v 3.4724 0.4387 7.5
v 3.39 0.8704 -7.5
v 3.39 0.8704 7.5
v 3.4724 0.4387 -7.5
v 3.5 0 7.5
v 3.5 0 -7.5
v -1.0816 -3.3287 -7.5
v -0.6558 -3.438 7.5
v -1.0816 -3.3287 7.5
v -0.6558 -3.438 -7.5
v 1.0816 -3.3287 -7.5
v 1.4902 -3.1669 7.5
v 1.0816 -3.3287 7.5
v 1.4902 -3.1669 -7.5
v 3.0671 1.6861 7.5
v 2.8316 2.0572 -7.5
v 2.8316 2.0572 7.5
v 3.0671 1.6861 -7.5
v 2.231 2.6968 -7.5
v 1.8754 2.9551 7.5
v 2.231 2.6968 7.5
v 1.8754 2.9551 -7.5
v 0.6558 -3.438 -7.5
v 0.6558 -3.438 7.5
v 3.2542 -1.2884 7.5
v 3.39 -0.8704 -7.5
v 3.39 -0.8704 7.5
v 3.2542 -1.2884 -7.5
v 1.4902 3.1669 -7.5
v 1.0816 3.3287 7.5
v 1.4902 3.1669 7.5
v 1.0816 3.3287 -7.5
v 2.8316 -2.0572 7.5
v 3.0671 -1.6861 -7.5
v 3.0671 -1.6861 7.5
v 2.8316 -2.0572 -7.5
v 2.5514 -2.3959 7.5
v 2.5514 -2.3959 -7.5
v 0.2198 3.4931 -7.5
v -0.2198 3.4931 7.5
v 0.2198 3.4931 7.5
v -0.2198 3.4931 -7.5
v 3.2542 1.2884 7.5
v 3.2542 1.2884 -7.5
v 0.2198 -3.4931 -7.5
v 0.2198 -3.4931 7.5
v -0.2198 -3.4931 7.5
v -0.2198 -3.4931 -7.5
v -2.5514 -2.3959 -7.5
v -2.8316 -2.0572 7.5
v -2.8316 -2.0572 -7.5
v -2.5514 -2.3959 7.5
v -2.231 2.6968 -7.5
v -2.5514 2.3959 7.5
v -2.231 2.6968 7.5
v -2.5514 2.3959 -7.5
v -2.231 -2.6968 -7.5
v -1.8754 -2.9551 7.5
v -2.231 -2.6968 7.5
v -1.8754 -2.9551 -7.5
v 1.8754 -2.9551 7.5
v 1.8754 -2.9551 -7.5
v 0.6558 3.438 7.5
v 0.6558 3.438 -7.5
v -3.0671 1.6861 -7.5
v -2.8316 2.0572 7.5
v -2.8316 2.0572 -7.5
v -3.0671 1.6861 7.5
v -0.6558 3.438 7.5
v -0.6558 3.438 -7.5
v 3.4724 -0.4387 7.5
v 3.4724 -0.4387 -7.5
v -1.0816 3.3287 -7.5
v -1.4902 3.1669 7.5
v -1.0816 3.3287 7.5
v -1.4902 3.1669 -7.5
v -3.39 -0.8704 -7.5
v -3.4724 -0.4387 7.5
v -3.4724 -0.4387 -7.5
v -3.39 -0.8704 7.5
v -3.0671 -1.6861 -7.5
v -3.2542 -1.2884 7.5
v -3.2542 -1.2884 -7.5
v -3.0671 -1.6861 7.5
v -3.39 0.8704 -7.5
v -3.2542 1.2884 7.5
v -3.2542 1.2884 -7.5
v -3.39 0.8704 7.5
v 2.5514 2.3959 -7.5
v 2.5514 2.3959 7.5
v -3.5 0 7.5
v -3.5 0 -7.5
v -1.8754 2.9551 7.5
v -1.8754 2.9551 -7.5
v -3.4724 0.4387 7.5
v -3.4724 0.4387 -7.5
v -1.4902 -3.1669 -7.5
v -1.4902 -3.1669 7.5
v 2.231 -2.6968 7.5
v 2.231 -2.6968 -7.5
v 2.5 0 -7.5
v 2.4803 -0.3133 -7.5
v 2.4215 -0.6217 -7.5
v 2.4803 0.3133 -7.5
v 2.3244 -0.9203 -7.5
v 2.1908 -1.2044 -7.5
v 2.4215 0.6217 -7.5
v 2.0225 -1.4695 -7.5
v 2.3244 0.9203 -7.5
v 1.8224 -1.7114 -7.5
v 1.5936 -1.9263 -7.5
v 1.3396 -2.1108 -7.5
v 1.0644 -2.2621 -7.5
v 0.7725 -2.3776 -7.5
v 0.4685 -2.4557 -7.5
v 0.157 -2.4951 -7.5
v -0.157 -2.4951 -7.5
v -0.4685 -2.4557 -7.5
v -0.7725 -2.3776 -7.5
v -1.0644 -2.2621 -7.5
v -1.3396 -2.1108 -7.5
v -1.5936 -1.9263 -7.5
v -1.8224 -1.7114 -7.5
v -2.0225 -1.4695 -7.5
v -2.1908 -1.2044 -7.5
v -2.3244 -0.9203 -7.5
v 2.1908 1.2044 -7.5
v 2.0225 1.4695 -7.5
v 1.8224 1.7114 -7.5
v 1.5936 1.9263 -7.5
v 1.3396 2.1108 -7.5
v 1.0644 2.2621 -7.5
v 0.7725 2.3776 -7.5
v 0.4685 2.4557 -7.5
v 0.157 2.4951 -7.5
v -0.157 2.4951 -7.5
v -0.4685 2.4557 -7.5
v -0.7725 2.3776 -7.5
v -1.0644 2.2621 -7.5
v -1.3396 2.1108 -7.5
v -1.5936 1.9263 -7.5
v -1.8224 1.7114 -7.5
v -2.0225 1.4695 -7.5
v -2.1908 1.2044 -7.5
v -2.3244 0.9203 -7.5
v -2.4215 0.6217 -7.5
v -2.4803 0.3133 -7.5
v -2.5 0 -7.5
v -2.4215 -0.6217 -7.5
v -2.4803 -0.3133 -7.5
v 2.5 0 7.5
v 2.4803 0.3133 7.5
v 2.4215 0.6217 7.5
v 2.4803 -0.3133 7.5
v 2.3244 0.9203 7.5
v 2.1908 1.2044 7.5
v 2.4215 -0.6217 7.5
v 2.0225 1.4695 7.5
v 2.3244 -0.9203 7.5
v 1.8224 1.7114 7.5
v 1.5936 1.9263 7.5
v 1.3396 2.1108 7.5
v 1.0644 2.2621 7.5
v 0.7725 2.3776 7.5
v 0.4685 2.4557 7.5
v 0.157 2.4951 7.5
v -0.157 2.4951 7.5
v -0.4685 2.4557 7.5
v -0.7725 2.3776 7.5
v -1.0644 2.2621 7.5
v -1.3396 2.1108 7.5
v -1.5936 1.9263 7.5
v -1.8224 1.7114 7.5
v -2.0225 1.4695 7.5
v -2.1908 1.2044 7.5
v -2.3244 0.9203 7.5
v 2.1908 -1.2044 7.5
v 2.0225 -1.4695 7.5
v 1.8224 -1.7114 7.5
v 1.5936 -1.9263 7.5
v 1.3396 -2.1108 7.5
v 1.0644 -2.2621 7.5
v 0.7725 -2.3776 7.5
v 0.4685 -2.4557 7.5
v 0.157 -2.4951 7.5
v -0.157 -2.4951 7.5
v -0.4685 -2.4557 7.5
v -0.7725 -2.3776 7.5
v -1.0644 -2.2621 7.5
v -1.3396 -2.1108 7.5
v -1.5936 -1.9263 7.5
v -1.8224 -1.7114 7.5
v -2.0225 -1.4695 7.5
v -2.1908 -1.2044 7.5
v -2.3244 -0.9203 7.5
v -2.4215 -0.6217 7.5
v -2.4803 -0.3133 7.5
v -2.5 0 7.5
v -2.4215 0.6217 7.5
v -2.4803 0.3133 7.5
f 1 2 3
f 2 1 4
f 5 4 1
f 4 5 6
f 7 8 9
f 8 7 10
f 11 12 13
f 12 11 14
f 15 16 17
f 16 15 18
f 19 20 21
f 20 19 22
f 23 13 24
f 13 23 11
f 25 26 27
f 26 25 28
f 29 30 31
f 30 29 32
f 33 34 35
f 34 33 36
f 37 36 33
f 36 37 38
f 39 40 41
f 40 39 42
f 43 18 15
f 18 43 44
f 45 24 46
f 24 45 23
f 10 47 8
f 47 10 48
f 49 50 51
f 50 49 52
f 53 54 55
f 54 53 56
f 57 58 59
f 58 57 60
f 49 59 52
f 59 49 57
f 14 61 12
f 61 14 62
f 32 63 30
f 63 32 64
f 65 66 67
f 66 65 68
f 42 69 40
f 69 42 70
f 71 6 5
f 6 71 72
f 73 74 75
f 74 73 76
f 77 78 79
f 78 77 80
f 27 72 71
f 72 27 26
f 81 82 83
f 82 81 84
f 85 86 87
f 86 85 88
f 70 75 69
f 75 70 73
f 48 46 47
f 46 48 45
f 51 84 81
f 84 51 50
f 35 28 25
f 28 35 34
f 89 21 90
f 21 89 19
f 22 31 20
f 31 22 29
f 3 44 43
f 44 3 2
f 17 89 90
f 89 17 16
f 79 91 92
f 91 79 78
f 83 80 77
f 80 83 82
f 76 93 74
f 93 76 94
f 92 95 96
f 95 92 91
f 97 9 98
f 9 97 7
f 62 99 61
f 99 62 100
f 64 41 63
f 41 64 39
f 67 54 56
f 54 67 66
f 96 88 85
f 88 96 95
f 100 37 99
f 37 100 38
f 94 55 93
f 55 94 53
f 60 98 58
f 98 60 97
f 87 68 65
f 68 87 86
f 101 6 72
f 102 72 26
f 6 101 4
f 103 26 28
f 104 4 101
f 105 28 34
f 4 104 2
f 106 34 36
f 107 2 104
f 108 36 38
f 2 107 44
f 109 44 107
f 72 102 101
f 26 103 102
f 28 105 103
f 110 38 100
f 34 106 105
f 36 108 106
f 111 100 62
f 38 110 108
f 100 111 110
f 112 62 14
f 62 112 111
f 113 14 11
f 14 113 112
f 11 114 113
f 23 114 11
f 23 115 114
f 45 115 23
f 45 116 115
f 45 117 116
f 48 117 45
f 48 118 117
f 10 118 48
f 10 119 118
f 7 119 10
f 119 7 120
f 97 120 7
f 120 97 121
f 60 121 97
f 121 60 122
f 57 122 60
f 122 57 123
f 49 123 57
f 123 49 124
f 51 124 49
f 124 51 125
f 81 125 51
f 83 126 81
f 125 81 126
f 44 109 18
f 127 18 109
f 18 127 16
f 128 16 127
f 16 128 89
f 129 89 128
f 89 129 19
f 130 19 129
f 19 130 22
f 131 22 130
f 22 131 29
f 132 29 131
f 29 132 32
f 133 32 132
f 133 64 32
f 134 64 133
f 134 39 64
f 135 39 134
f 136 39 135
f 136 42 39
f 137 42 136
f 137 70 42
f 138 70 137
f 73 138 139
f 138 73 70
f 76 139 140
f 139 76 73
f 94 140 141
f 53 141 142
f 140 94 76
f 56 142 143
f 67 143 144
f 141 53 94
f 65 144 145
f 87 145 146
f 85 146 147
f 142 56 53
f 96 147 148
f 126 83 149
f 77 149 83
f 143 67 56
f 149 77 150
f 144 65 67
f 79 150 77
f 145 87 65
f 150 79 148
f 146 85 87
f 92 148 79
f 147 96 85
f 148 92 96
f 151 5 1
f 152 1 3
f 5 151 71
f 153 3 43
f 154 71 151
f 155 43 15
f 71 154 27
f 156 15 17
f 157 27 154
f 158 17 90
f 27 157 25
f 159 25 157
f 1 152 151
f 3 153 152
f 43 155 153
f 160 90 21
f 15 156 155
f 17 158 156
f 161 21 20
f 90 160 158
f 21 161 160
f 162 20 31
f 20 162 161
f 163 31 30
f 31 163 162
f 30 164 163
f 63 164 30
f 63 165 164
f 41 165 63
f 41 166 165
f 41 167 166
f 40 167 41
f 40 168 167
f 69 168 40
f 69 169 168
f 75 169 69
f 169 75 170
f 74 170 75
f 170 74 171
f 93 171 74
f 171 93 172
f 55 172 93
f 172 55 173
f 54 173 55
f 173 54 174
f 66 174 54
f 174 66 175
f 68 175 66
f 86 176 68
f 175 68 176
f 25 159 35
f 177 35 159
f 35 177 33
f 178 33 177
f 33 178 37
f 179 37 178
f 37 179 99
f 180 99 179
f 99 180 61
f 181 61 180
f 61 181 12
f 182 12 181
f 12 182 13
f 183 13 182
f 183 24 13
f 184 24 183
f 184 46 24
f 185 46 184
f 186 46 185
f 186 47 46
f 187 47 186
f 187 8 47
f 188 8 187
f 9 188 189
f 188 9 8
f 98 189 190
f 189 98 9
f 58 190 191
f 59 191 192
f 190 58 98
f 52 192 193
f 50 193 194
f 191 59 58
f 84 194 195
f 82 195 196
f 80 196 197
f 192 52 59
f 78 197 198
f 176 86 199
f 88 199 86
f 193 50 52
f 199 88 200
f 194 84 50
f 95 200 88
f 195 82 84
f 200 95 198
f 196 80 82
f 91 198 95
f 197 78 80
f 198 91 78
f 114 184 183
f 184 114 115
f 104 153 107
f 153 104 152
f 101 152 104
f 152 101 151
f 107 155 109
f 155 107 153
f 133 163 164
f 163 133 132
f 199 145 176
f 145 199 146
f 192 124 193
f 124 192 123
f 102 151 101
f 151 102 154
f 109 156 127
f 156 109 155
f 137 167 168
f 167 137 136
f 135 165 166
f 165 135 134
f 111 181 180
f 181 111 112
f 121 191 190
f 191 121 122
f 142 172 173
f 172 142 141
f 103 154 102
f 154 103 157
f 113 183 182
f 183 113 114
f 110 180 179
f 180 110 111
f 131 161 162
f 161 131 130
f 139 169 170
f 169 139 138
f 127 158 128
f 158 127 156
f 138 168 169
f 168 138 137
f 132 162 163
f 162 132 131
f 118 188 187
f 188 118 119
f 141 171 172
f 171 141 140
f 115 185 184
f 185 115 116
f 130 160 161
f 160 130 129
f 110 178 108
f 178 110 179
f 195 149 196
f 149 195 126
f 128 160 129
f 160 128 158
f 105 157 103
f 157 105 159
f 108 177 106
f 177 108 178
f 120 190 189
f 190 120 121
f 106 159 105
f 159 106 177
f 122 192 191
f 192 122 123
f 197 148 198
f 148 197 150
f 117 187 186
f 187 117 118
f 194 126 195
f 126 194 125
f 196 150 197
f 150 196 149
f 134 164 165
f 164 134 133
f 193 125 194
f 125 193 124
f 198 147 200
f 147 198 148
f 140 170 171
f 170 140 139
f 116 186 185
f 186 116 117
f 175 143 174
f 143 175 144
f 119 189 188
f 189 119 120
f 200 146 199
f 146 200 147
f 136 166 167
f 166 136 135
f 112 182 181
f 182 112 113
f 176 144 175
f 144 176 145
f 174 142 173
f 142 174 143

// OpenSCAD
$fn = 50;


difference() {
	union() {
		translate(v = [0, 0, -7.5000000000]) {
			cylinder(h = 15, r = 3.5000000000);
		}
	}
	union() {
		translate(v = [0, 0, -100.0000000000]) {
			cylinder(h = 200, r = 2.5000000000);
		}
	}
}
